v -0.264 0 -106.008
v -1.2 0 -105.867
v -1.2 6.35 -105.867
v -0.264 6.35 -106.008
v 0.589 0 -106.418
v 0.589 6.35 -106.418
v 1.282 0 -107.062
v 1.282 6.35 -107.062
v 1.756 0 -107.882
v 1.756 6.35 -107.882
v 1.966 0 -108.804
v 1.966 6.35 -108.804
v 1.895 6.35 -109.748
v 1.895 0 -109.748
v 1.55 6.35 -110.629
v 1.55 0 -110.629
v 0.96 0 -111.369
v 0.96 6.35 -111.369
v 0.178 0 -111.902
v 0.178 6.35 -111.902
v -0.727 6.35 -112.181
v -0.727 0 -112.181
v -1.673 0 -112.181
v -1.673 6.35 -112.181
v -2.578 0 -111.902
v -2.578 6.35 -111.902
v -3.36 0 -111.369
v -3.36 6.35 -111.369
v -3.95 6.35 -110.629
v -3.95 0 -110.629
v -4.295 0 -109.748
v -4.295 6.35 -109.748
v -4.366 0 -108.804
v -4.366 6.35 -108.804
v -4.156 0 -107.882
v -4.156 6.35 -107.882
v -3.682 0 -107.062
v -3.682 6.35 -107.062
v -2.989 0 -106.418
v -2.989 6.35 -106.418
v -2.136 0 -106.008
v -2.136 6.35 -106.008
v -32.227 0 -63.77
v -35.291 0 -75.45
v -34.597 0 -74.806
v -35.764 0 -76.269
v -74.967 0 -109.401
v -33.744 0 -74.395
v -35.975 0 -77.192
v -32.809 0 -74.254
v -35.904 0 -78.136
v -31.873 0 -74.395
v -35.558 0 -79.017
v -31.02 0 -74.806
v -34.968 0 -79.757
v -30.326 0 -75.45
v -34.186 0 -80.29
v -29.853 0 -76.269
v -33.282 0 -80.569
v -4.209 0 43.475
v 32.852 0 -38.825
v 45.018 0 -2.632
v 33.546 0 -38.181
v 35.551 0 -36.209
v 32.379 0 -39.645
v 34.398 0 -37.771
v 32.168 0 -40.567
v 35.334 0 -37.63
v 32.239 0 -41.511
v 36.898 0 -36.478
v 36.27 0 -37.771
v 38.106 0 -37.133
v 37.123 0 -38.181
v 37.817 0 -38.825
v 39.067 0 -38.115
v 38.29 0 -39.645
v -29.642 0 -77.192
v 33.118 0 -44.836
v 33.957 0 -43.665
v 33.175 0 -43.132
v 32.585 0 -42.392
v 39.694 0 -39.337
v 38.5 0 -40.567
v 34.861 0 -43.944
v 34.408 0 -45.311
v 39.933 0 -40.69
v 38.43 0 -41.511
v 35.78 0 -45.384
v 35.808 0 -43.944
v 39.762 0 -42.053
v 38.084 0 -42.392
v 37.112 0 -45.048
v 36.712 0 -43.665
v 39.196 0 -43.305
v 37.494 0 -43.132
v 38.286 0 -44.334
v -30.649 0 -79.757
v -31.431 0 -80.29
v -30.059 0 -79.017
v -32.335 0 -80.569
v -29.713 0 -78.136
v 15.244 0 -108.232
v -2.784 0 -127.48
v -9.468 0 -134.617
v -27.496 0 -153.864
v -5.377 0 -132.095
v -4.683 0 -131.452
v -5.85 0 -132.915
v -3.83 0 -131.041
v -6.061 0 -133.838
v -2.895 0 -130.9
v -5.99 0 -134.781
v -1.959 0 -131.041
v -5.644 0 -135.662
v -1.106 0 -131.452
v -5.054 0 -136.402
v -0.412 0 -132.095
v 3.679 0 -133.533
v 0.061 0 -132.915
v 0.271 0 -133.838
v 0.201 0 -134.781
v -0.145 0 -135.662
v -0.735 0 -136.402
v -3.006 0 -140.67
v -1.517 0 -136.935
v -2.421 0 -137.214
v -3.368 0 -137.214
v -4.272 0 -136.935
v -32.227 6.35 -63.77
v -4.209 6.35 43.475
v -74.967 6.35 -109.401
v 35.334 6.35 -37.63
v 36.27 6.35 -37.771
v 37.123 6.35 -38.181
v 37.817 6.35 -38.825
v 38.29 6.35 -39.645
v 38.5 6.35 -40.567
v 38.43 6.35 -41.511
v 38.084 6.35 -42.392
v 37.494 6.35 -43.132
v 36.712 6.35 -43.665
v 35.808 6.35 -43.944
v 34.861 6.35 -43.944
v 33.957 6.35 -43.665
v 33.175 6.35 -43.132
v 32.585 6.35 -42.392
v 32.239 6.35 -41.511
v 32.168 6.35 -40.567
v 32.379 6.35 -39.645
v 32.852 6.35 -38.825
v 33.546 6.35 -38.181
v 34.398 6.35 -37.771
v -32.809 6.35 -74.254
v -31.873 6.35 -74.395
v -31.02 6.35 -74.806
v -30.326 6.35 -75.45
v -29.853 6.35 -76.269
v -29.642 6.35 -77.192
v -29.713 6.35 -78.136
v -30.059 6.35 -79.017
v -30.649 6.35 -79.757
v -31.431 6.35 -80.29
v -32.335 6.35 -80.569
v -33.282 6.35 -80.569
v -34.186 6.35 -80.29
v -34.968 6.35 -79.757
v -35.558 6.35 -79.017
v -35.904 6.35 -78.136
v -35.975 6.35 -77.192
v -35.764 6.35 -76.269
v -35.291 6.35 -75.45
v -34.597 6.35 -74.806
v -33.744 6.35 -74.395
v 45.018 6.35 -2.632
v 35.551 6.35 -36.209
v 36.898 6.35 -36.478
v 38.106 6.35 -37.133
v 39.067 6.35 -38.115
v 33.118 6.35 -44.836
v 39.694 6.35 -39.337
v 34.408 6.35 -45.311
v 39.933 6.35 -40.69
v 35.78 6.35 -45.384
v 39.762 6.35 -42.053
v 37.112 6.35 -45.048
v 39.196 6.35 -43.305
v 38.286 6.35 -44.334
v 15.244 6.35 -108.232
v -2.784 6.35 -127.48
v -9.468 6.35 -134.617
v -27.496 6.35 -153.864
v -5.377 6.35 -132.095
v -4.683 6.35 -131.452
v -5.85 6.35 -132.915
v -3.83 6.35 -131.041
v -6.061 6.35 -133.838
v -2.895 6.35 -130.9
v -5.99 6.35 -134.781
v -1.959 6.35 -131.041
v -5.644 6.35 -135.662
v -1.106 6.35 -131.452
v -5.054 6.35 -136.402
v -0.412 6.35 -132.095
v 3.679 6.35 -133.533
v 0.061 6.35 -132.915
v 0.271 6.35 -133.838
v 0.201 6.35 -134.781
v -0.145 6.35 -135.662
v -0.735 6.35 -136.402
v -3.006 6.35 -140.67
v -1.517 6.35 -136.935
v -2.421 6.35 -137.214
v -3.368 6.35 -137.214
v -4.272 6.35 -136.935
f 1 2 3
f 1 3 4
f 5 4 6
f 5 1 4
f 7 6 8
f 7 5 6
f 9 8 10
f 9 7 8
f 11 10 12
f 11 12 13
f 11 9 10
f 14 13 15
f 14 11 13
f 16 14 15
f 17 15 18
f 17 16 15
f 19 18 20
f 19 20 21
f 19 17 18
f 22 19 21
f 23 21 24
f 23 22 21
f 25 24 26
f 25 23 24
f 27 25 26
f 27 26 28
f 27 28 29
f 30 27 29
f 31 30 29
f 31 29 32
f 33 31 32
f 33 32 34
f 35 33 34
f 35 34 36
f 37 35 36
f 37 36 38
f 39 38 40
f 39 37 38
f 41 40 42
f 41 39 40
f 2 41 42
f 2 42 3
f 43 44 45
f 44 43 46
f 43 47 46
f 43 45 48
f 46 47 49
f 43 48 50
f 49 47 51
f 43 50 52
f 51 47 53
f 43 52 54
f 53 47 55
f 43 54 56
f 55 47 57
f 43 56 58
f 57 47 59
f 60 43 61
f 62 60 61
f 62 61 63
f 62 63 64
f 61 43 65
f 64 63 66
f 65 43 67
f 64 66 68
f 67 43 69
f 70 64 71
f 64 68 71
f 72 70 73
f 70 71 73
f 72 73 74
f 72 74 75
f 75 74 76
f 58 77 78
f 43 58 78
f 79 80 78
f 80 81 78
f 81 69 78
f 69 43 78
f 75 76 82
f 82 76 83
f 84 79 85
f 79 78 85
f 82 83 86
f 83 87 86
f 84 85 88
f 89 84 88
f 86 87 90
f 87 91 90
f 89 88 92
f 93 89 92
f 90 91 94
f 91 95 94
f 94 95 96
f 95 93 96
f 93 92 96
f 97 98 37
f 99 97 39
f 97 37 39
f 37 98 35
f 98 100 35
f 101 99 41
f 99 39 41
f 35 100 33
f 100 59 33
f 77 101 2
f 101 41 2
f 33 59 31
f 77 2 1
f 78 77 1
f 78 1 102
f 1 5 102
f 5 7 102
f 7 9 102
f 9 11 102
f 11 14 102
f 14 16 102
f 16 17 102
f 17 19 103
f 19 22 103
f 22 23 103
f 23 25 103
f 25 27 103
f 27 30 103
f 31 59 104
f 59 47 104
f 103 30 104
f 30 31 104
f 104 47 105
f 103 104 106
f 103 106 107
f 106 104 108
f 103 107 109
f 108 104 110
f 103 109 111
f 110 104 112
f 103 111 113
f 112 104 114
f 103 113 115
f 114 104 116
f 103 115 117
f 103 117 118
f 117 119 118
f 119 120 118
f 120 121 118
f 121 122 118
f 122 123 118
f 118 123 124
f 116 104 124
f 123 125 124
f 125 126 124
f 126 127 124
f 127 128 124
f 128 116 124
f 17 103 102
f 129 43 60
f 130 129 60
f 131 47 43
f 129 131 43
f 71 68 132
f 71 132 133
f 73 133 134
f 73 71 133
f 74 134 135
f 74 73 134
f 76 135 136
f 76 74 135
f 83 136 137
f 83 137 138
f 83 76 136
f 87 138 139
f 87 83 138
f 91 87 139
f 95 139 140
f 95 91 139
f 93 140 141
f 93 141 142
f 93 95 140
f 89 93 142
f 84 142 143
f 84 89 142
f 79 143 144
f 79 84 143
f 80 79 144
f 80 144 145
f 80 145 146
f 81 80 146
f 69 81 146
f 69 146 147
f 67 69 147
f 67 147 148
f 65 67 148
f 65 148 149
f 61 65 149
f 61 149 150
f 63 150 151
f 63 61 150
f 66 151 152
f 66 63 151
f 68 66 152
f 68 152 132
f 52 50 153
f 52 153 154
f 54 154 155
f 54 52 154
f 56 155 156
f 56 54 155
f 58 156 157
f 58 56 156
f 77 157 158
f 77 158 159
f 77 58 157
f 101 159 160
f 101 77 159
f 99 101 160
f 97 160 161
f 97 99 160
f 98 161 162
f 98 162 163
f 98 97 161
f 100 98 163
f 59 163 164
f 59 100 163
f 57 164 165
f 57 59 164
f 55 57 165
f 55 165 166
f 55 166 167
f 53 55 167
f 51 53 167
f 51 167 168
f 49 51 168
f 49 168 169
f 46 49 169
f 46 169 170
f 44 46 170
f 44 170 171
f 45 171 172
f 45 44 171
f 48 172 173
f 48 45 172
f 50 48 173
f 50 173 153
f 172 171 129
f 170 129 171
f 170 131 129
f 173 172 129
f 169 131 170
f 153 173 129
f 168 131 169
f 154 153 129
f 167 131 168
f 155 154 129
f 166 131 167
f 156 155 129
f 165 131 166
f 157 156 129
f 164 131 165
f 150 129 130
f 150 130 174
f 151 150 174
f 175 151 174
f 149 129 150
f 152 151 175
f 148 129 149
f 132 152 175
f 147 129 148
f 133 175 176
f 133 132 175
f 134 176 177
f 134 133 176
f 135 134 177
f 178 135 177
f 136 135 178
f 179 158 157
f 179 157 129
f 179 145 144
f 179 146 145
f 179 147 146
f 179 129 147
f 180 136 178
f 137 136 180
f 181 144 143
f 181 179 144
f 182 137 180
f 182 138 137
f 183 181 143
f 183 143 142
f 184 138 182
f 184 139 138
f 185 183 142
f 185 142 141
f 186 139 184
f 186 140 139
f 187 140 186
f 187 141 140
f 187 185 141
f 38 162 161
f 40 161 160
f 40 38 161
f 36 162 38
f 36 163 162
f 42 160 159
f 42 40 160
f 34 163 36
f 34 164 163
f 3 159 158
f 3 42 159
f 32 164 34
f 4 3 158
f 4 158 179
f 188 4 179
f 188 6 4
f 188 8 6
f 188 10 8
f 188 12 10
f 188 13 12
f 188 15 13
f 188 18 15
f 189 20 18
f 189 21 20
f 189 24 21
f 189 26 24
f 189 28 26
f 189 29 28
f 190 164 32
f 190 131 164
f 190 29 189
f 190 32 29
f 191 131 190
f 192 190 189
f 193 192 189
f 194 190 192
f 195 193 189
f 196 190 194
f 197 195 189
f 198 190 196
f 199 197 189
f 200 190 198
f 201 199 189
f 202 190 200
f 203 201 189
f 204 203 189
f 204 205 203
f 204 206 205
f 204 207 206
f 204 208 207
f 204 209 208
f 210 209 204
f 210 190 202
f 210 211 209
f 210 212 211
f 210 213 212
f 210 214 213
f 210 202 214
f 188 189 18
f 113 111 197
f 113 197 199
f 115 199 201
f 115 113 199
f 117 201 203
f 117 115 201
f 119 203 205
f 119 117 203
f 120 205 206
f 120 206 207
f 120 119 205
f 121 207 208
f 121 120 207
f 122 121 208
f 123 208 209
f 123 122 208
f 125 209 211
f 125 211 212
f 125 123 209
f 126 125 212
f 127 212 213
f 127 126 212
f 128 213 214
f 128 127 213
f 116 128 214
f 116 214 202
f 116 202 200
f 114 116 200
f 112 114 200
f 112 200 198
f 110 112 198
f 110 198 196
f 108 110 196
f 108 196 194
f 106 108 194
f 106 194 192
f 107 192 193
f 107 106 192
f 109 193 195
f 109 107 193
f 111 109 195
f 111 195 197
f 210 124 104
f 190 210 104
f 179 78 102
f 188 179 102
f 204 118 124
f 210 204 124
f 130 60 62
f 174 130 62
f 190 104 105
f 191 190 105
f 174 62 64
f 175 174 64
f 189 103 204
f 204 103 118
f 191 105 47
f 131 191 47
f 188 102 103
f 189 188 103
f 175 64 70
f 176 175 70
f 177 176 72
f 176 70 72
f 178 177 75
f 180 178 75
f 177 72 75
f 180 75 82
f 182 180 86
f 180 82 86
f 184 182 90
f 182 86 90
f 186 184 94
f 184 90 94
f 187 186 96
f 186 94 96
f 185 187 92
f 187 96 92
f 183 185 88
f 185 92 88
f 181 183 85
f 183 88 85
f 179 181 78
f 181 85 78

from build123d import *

# Parameters (mm, degrees)
SKETCH1_R           = 3.175
BOSS_EXTRUDE1_DEPTH = 6.35


with BuildPart() as part:
    # Sketch1 → Boss-Extrude1 (new body)
    with BuildSketch(Plane(origin=(0, 0, 0), x_dir=(1, 0, 0), z_dir=(0, 1, 0))):
        with BuildLine():
            Line((45.017746951, 2.631829887), (35.550660053, 36.209226482))
            ThreePointArc((35.550660053, 36.209226482), (39.762177432, 42.05307025), (33.11828595, 44.83625091))
            Line((33.11828595, 44.83625091), (15.243844224, 108.232438689))
            Line((15.243844224, 108.232438689), (-2.783728935, 127.479661752))
            Line((-2.783728935, 127.479661752), (3.678966496, 133.532831827))
            Line((3.678966496, 133.532831827), (-3.005742225, 140.669792455))
            Line((-3.005742225, 140.669792455), (-9.468437655, 134.61662238))
            Line((-9.468437655, 134.61662238), (-27.496010814, 153.863845442))
            Line((-27.496010814, 153.863845442), (-74.966911398, 109.401060841))
            Line((-74.966911398, 109.401060841), (-32.227053049, 63.769650553))
            Line((-32.227053049, 63.769650553), (-4.208751998, -43.475305064))
            Line((-4.208751998, -43.475305064), (45.017746951, 2.631829887))
        make_face()
        with Locations(Location((-2.894634056, 134.074815557, 0), (0, 0, 270))):
            Circle(SKETCH1_R, mode=Mode.SUBTRACT)
        with Locations(Location((35.334305242, 40.804639607, 0), (0, 0, 270))):
            Circle(SKETCH1_R, mode=Mode.SUBTRACT)
        with Locations(Location((-32.808552916, 77.429328599, 0), (0, 0, 270))):
            Circle(SKETCH1_R, mode=Mode.SUBTRACT)
        with Locations(Location((-1.199981142, 109.041759799, 0), (0, 0, 270))):
            Circle(SKETCH1_R, mode=Mode.SUBTRACT)
    extrude(amount=BOSS_EXTRUDE1_DEPTH)


solid = part.part
